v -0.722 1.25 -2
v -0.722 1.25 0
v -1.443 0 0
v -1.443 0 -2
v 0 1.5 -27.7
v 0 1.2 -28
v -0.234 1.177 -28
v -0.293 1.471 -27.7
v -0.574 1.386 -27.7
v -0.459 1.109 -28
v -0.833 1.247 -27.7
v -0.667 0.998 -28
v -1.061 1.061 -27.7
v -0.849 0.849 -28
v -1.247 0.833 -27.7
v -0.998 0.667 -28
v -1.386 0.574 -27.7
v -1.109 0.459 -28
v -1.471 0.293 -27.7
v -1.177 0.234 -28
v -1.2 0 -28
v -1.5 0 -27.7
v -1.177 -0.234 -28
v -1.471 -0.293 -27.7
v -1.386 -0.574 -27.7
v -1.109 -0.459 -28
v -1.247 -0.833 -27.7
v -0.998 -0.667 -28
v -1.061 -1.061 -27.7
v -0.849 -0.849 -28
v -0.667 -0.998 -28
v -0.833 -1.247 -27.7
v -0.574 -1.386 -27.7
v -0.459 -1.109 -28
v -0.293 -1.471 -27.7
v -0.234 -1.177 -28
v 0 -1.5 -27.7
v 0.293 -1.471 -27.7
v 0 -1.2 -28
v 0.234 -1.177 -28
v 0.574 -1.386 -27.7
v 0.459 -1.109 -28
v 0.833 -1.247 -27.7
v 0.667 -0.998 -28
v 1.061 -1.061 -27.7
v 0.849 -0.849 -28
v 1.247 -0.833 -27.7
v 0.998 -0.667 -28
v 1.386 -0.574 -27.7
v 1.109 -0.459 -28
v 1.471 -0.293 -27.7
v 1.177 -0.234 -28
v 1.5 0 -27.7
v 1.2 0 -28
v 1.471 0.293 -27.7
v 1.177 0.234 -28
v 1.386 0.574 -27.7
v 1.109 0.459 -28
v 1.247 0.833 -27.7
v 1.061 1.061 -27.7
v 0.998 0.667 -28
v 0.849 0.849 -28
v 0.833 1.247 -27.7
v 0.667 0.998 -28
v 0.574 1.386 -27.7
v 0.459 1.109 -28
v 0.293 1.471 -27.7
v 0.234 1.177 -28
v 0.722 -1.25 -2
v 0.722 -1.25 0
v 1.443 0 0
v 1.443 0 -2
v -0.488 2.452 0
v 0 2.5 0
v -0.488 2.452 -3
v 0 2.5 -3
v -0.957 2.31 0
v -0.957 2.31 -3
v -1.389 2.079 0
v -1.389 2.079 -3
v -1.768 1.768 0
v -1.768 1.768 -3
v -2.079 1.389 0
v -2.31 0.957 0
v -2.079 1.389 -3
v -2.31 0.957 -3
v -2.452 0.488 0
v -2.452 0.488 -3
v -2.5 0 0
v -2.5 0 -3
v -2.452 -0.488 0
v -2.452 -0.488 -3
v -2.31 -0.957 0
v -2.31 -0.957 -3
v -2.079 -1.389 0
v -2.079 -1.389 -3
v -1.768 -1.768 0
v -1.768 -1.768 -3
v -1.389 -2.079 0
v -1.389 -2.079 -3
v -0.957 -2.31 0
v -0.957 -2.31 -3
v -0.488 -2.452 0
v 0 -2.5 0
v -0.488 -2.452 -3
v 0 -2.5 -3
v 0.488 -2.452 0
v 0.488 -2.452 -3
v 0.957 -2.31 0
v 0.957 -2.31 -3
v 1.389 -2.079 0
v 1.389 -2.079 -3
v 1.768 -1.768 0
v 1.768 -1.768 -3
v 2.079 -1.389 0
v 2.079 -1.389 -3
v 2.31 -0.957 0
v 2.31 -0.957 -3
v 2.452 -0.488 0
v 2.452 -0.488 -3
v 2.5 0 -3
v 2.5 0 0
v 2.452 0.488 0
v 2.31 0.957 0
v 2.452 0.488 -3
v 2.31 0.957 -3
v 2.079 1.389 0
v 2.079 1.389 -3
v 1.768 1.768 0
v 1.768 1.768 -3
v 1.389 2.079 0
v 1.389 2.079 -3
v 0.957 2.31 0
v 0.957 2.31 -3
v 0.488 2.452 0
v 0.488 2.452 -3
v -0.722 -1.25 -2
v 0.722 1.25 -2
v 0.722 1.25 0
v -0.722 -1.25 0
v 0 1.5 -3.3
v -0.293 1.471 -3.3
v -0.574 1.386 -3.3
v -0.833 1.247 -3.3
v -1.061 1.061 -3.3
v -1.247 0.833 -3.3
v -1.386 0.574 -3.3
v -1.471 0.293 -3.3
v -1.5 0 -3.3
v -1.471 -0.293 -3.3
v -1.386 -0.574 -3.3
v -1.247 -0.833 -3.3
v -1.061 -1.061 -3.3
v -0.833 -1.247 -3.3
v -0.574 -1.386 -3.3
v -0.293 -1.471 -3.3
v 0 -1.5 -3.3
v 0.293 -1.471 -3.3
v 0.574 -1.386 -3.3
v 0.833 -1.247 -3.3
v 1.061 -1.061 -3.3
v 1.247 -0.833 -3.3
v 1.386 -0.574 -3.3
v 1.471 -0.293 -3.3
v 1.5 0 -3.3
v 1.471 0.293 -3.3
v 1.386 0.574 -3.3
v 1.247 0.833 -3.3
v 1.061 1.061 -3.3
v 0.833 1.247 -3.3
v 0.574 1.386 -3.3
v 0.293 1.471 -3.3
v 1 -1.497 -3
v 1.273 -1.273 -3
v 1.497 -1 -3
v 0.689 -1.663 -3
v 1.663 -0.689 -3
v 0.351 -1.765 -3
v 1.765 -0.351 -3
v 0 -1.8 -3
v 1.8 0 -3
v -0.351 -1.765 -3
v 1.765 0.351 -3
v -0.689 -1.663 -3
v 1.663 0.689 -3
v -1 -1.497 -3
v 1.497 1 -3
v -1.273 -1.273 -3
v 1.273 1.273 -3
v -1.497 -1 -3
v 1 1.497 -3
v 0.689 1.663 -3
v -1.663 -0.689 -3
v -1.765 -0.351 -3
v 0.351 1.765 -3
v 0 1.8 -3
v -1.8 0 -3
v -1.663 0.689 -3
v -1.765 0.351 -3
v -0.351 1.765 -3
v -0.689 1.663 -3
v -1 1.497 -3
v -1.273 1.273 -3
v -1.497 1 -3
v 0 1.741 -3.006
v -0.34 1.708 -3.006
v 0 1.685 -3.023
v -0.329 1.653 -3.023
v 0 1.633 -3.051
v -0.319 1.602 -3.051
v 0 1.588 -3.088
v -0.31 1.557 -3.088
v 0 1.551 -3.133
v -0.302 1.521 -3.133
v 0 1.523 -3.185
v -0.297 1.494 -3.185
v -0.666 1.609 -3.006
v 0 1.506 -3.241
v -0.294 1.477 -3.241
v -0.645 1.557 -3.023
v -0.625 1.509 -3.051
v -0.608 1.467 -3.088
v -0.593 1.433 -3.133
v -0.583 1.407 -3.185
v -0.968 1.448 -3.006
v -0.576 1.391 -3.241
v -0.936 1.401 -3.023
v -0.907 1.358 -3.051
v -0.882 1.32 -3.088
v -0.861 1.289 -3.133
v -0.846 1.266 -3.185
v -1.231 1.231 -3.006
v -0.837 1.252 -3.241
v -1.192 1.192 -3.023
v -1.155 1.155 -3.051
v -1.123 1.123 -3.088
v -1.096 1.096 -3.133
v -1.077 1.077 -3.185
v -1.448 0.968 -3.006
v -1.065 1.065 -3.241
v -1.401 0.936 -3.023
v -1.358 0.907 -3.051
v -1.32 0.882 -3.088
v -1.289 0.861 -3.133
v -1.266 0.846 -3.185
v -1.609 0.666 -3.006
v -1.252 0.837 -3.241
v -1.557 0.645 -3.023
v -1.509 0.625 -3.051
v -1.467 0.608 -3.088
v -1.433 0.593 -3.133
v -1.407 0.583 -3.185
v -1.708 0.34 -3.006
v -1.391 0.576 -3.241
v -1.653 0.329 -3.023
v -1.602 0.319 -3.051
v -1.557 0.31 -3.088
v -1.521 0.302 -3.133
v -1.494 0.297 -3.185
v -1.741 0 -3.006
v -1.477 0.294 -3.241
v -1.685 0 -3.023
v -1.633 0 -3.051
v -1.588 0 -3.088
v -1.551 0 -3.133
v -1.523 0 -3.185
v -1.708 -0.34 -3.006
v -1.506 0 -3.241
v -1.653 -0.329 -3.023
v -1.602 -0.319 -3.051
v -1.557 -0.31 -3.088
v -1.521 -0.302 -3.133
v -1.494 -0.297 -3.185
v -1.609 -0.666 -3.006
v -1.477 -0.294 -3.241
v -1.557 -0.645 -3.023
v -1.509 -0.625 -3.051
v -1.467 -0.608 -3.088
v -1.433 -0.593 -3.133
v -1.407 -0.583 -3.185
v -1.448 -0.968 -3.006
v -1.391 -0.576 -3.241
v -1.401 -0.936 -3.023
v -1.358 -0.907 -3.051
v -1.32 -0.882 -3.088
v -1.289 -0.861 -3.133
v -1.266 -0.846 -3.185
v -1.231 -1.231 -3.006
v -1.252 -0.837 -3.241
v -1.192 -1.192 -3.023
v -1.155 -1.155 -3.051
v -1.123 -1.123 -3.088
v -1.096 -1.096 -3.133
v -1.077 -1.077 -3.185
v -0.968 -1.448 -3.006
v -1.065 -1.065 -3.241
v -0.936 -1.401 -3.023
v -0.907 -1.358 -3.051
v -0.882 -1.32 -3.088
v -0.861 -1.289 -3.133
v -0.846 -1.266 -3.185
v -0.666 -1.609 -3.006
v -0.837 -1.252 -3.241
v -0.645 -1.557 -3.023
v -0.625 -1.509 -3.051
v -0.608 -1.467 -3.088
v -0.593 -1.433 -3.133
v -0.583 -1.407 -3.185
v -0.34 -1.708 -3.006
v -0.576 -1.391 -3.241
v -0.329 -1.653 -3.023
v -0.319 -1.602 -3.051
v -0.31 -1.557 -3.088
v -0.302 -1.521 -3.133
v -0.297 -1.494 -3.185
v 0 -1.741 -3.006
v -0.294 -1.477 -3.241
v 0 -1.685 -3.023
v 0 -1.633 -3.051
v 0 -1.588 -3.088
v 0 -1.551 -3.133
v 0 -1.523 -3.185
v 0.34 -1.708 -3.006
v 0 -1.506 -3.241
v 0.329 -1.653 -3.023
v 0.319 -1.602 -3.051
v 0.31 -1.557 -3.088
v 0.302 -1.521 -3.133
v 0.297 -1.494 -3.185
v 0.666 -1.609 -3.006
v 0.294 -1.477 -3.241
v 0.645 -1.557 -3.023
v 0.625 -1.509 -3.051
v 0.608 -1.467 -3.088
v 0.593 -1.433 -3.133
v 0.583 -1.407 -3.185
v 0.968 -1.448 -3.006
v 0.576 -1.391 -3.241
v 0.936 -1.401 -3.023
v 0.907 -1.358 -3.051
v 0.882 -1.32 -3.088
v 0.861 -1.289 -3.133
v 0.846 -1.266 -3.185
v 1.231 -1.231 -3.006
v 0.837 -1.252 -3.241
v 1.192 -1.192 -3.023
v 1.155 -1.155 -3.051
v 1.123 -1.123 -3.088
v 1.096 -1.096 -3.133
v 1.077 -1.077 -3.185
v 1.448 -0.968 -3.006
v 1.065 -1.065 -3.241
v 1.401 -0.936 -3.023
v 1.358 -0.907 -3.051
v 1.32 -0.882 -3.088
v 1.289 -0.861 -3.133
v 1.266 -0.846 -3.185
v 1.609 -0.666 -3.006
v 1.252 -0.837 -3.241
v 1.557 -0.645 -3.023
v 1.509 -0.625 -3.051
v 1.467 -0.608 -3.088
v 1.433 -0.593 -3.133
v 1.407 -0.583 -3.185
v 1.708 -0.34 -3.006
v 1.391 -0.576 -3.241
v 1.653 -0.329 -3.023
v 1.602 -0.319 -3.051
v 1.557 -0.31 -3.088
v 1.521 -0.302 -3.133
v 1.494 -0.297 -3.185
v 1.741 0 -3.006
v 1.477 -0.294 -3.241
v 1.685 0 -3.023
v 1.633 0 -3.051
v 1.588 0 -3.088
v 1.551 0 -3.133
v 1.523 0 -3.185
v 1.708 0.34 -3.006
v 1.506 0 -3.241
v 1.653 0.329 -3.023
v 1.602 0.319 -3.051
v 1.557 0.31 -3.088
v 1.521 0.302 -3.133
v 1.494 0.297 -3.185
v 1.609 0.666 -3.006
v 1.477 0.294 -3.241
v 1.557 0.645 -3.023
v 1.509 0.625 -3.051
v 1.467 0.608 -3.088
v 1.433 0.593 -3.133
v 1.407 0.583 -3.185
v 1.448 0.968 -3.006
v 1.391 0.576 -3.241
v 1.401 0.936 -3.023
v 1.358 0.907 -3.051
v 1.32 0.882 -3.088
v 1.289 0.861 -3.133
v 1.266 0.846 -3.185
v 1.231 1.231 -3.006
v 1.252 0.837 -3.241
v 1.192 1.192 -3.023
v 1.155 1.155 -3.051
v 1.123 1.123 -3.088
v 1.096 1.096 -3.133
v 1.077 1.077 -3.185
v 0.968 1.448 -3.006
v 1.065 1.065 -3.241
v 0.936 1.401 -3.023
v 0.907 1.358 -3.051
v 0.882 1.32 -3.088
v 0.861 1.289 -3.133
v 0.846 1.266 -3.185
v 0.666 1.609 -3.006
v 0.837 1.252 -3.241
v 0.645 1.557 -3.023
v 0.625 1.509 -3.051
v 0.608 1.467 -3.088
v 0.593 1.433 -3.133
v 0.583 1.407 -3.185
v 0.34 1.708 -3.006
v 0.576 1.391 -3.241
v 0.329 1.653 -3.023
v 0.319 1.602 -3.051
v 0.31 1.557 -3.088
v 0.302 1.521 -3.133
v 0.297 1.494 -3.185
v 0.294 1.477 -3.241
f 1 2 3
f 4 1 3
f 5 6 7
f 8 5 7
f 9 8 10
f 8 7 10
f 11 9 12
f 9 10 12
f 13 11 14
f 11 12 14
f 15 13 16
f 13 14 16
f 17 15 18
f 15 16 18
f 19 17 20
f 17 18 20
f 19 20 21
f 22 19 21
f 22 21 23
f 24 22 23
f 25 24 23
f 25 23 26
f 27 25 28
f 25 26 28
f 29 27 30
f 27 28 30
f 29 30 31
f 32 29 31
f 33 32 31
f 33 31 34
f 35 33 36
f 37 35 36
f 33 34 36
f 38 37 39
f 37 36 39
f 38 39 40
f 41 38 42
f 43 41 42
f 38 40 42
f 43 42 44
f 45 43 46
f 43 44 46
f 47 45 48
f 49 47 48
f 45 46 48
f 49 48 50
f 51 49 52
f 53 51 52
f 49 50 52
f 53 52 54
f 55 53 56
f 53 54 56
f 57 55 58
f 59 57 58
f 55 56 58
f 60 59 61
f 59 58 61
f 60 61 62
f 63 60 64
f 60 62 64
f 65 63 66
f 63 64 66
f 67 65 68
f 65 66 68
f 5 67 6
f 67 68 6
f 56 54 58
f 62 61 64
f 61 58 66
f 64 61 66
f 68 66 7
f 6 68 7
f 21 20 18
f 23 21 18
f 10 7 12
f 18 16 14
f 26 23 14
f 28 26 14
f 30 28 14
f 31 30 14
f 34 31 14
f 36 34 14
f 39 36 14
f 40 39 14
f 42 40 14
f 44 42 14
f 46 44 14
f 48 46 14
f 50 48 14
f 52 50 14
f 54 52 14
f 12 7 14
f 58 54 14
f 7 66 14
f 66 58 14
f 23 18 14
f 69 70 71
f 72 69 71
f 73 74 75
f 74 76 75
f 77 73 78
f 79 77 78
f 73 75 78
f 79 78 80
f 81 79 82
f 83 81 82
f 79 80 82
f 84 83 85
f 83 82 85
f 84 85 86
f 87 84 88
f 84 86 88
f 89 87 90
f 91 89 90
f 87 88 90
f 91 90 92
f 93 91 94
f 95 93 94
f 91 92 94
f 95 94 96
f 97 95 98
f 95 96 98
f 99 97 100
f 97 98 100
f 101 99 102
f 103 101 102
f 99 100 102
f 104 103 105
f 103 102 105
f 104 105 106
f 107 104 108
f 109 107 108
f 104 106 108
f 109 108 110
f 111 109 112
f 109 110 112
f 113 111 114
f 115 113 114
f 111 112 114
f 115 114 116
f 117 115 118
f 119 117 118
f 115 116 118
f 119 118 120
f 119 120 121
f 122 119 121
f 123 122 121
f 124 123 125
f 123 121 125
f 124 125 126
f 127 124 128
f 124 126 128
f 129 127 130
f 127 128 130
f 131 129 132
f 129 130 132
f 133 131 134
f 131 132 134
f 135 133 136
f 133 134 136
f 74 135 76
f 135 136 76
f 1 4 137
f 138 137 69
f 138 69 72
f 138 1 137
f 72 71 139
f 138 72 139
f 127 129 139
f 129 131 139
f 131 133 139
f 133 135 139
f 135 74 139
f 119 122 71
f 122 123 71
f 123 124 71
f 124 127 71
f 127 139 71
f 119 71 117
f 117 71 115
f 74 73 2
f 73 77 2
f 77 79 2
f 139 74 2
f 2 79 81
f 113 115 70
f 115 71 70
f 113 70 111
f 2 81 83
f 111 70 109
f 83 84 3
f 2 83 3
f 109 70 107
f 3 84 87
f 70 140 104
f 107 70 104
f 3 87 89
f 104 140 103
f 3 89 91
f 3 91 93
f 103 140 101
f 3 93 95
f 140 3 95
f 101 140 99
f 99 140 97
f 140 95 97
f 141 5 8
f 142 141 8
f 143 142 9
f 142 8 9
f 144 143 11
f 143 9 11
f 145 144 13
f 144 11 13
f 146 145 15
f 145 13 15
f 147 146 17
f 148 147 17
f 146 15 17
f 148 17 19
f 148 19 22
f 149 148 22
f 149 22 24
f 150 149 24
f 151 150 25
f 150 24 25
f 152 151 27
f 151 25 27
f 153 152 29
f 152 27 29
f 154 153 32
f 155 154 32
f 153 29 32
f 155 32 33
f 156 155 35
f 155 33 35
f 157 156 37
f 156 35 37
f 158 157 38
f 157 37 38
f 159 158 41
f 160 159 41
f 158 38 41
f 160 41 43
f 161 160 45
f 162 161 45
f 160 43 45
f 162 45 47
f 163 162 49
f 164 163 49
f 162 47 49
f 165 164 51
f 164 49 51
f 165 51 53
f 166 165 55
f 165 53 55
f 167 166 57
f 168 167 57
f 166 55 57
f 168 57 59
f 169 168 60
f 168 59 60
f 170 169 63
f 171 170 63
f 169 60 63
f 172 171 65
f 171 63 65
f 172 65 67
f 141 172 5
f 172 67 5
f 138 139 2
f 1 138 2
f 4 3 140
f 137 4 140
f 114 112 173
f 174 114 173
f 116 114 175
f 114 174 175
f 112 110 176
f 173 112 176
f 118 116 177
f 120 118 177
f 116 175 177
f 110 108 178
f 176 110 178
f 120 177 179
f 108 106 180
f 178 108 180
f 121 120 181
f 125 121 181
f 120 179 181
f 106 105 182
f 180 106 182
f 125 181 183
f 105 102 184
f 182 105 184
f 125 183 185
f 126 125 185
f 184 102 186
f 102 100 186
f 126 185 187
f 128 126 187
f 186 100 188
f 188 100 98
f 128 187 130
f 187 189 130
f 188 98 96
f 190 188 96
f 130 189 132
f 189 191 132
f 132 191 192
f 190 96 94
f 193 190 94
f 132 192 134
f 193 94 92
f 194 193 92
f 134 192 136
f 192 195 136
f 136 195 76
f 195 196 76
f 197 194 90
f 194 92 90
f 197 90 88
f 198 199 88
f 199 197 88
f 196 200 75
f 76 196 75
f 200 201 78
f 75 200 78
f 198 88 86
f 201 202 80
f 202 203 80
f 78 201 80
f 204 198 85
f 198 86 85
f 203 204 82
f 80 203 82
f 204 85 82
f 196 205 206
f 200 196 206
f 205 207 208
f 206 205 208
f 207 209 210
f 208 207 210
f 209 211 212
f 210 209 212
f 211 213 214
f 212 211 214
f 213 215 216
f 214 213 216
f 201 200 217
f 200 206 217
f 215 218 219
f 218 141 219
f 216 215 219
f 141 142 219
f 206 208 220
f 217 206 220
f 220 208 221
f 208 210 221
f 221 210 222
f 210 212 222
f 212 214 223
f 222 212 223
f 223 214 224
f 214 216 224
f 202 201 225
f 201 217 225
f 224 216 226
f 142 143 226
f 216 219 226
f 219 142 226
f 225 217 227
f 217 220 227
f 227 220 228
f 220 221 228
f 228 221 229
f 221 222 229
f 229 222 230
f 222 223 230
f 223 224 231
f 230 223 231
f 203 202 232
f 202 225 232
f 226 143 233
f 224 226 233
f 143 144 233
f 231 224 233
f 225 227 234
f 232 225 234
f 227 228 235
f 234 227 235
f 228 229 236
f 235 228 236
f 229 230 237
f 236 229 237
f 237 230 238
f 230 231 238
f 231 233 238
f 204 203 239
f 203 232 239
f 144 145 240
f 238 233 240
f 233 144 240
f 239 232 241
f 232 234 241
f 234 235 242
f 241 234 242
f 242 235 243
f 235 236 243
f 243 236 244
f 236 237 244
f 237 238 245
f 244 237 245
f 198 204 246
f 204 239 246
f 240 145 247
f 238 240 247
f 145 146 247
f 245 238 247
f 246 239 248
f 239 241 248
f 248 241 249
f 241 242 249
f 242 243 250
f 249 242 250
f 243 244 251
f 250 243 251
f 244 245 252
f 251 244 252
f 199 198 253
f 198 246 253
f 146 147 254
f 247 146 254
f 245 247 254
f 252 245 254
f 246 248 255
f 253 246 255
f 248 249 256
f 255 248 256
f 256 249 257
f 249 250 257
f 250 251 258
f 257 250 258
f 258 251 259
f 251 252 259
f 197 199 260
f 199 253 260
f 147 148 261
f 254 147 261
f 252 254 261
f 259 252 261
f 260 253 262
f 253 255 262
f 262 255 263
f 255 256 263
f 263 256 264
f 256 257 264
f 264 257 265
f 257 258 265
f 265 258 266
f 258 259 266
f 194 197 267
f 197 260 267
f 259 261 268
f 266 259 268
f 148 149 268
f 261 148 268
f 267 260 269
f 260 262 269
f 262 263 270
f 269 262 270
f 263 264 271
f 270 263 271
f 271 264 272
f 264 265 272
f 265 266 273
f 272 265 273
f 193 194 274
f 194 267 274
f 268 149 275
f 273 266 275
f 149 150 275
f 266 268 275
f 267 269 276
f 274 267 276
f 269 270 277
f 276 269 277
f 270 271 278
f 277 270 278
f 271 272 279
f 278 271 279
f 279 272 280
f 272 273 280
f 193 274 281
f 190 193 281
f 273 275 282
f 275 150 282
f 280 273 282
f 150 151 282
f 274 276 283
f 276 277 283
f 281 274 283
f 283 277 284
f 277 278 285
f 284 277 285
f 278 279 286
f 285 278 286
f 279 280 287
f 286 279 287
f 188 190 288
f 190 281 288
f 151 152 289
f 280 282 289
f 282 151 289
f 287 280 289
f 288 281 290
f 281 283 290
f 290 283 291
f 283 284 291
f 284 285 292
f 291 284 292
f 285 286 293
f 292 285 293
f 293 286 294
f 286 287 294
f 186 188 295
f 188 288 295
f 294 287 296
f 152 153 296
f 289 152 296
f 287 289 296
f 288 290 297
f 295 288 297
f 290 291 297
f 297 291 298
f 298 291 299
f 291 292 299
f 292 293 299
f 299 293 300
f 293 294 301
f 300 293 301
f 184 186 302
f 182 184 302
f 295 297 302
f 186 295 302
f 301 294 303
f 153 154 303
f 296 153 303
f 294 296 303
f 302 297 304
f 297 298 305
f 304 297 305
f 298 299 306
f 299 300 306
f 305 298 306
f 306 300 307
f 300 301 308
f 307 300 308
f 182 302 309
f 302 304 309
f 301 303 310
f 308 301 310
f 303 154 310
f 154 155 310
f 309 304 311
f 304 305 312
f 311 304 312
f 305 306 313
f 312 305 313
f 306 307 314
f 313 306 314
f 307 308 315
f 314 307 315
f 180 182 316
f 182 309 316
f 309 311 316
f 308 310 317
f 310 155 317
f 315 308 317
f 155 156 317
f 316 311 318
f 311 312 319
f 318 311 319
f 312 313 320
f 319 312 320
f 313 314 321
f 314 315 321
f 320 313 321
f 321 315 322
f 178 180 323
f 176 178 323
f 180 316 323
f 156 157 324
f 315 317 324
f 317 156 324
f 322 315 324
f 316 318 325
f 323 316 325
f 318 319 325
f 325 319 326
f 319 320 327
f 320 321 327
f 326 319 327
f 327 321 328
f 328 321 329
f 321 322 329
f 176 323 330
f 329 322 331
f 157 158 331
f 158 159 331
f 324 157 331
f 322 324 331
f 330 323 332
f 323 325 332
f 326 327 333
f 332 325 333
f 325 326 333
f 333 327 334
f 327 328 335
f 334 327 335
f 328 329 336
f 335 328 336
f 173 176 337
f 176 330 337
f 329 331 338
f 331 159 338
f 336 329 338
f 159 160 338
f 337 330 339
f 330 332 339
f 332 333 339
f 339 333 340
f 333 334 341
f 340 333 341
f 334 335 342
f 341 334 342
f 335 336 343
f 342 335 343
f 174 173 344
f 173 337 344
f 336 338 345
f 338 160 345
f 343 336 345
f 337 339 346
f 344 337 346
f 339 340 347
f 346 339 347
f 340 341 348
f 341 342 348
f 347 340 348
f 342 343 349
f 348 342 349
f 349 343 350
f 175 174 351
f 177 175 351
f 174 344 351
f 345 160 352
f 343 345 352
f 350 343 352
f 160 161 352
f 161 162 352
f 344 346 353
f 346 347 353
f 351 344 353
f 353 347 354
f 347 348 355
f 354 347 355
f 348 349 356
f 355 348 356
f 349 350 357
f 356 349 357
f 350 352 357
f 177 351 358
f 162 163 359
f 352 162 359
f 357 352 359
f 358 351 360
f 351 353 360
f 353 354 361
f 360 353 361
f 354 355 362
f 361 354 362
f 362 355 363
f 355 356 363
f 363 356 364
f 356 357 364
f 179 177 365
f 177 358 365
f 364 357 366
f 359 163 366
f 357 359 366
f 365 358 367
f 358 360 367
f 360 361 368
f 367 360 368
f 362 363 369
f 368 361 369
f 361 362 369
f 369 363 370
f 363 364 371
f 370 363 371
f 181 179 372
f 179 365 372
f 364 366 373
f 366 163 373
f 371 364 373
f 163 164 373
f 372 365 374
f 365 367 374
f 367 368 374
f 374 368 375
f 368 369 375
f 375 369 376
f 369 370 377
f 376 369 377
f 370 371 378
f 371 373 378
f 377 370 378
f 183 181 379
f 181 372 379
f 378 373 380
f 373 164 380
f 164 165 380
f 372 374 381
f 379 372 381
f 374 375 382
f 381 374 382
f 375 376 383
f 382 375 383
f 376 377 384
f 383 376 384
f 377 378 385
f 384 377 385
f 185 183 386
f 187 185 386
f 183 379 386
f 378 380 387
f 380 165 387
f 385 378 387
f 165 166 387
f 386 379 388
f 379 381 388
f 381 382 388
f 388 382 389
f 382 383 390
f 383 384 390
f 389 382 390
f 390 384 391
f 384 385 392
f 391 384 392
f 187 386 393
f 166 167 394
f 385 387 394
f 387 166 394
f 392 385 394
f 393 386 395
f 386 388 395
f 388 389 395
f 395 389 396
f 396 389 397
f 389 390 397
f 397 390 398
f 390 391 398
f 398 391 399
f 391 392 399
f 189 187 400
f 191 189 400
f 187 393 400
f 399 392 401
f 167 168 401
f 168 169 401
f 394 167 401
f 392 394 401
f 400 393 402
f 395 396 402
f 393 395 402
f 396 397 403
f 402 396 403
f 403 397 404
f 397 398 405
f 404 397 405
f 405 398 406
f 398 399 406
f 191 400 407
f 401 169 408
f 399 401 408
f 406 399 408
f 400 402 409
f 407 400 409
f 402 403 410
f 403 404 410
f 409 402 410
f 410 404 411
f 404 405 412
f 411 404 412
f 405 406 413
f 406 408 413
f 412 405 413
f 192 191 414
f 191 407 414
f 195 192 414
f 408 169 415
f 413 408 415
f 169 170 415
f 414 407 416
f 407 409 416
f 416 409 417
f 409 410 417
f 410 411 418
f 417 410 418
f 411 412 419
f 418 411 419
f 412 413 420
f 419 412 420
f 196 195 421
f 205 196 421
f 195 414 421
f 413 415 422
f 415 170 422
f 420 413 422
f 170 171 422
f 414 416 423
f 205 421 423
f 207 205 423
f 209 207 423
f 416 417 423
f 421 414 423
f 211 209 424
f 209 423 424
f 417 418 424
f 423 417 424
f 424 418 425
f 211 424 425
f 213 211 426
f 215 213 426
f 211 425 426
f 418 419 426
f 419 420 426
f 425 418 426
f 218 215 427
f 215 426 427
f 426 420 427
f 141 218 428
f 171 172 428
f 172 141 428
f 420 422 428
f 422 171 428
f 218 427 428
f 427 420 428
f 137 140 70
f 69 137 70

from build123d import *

# Parameters (mm, degrees)
CUT_EXTRUDE_1_DEPTH = 2
FILLET_1_R          = 0.3
CHAMFER_1_SIZE      = 0.3


with BuildPart() as part:
    # Эскиз1 → Повернуть1 (revolve)
    with BuildSketch(Plane(origin=(0, 0, 0), x_dir=(0, 0, -1), z_dir=(1, 0, 0))):
        Polygon((0, 0), (0, 2.5), (3, 2.5), (3, 1.5), (28, 1.5), (28, 0), align=None)
    revolve(axis=Axis((0, 0, 0), (0, 0, 1)))

    # Эскиз2 → Вырез-Вытянуть1 (cut)
    with BuildSketch(Plane.XY):
        Polygon((1.443375673, 0), (0.721687836, 1.25), (-0.721687836, 1.25), (-1.443375673, 0), (-0.721687836, -1.25), (0.721687836, -1.25), align=None)
    extrude(amount=-CUT_EXTRUDE_1_DEPTH, mode=Mode.SUBTRACT)

    # Скругление1
    fillet_1_edges = [part.edges().sort_by_distance(p)[0] for p in [
        (0, -1.5, -3),
    ]]
    fillet(fillet_1_edges, radius=FILLET_1_R)

    # Фаска1
    chamfer_1_edges = [part.edges().sort_by_distance(p)[0] for p in [
        (0, -1.5, -28),
    ]]
    chamfer(chamfer_1_edges, length=CHAMFER_1_SIZE)


solid = part.part
